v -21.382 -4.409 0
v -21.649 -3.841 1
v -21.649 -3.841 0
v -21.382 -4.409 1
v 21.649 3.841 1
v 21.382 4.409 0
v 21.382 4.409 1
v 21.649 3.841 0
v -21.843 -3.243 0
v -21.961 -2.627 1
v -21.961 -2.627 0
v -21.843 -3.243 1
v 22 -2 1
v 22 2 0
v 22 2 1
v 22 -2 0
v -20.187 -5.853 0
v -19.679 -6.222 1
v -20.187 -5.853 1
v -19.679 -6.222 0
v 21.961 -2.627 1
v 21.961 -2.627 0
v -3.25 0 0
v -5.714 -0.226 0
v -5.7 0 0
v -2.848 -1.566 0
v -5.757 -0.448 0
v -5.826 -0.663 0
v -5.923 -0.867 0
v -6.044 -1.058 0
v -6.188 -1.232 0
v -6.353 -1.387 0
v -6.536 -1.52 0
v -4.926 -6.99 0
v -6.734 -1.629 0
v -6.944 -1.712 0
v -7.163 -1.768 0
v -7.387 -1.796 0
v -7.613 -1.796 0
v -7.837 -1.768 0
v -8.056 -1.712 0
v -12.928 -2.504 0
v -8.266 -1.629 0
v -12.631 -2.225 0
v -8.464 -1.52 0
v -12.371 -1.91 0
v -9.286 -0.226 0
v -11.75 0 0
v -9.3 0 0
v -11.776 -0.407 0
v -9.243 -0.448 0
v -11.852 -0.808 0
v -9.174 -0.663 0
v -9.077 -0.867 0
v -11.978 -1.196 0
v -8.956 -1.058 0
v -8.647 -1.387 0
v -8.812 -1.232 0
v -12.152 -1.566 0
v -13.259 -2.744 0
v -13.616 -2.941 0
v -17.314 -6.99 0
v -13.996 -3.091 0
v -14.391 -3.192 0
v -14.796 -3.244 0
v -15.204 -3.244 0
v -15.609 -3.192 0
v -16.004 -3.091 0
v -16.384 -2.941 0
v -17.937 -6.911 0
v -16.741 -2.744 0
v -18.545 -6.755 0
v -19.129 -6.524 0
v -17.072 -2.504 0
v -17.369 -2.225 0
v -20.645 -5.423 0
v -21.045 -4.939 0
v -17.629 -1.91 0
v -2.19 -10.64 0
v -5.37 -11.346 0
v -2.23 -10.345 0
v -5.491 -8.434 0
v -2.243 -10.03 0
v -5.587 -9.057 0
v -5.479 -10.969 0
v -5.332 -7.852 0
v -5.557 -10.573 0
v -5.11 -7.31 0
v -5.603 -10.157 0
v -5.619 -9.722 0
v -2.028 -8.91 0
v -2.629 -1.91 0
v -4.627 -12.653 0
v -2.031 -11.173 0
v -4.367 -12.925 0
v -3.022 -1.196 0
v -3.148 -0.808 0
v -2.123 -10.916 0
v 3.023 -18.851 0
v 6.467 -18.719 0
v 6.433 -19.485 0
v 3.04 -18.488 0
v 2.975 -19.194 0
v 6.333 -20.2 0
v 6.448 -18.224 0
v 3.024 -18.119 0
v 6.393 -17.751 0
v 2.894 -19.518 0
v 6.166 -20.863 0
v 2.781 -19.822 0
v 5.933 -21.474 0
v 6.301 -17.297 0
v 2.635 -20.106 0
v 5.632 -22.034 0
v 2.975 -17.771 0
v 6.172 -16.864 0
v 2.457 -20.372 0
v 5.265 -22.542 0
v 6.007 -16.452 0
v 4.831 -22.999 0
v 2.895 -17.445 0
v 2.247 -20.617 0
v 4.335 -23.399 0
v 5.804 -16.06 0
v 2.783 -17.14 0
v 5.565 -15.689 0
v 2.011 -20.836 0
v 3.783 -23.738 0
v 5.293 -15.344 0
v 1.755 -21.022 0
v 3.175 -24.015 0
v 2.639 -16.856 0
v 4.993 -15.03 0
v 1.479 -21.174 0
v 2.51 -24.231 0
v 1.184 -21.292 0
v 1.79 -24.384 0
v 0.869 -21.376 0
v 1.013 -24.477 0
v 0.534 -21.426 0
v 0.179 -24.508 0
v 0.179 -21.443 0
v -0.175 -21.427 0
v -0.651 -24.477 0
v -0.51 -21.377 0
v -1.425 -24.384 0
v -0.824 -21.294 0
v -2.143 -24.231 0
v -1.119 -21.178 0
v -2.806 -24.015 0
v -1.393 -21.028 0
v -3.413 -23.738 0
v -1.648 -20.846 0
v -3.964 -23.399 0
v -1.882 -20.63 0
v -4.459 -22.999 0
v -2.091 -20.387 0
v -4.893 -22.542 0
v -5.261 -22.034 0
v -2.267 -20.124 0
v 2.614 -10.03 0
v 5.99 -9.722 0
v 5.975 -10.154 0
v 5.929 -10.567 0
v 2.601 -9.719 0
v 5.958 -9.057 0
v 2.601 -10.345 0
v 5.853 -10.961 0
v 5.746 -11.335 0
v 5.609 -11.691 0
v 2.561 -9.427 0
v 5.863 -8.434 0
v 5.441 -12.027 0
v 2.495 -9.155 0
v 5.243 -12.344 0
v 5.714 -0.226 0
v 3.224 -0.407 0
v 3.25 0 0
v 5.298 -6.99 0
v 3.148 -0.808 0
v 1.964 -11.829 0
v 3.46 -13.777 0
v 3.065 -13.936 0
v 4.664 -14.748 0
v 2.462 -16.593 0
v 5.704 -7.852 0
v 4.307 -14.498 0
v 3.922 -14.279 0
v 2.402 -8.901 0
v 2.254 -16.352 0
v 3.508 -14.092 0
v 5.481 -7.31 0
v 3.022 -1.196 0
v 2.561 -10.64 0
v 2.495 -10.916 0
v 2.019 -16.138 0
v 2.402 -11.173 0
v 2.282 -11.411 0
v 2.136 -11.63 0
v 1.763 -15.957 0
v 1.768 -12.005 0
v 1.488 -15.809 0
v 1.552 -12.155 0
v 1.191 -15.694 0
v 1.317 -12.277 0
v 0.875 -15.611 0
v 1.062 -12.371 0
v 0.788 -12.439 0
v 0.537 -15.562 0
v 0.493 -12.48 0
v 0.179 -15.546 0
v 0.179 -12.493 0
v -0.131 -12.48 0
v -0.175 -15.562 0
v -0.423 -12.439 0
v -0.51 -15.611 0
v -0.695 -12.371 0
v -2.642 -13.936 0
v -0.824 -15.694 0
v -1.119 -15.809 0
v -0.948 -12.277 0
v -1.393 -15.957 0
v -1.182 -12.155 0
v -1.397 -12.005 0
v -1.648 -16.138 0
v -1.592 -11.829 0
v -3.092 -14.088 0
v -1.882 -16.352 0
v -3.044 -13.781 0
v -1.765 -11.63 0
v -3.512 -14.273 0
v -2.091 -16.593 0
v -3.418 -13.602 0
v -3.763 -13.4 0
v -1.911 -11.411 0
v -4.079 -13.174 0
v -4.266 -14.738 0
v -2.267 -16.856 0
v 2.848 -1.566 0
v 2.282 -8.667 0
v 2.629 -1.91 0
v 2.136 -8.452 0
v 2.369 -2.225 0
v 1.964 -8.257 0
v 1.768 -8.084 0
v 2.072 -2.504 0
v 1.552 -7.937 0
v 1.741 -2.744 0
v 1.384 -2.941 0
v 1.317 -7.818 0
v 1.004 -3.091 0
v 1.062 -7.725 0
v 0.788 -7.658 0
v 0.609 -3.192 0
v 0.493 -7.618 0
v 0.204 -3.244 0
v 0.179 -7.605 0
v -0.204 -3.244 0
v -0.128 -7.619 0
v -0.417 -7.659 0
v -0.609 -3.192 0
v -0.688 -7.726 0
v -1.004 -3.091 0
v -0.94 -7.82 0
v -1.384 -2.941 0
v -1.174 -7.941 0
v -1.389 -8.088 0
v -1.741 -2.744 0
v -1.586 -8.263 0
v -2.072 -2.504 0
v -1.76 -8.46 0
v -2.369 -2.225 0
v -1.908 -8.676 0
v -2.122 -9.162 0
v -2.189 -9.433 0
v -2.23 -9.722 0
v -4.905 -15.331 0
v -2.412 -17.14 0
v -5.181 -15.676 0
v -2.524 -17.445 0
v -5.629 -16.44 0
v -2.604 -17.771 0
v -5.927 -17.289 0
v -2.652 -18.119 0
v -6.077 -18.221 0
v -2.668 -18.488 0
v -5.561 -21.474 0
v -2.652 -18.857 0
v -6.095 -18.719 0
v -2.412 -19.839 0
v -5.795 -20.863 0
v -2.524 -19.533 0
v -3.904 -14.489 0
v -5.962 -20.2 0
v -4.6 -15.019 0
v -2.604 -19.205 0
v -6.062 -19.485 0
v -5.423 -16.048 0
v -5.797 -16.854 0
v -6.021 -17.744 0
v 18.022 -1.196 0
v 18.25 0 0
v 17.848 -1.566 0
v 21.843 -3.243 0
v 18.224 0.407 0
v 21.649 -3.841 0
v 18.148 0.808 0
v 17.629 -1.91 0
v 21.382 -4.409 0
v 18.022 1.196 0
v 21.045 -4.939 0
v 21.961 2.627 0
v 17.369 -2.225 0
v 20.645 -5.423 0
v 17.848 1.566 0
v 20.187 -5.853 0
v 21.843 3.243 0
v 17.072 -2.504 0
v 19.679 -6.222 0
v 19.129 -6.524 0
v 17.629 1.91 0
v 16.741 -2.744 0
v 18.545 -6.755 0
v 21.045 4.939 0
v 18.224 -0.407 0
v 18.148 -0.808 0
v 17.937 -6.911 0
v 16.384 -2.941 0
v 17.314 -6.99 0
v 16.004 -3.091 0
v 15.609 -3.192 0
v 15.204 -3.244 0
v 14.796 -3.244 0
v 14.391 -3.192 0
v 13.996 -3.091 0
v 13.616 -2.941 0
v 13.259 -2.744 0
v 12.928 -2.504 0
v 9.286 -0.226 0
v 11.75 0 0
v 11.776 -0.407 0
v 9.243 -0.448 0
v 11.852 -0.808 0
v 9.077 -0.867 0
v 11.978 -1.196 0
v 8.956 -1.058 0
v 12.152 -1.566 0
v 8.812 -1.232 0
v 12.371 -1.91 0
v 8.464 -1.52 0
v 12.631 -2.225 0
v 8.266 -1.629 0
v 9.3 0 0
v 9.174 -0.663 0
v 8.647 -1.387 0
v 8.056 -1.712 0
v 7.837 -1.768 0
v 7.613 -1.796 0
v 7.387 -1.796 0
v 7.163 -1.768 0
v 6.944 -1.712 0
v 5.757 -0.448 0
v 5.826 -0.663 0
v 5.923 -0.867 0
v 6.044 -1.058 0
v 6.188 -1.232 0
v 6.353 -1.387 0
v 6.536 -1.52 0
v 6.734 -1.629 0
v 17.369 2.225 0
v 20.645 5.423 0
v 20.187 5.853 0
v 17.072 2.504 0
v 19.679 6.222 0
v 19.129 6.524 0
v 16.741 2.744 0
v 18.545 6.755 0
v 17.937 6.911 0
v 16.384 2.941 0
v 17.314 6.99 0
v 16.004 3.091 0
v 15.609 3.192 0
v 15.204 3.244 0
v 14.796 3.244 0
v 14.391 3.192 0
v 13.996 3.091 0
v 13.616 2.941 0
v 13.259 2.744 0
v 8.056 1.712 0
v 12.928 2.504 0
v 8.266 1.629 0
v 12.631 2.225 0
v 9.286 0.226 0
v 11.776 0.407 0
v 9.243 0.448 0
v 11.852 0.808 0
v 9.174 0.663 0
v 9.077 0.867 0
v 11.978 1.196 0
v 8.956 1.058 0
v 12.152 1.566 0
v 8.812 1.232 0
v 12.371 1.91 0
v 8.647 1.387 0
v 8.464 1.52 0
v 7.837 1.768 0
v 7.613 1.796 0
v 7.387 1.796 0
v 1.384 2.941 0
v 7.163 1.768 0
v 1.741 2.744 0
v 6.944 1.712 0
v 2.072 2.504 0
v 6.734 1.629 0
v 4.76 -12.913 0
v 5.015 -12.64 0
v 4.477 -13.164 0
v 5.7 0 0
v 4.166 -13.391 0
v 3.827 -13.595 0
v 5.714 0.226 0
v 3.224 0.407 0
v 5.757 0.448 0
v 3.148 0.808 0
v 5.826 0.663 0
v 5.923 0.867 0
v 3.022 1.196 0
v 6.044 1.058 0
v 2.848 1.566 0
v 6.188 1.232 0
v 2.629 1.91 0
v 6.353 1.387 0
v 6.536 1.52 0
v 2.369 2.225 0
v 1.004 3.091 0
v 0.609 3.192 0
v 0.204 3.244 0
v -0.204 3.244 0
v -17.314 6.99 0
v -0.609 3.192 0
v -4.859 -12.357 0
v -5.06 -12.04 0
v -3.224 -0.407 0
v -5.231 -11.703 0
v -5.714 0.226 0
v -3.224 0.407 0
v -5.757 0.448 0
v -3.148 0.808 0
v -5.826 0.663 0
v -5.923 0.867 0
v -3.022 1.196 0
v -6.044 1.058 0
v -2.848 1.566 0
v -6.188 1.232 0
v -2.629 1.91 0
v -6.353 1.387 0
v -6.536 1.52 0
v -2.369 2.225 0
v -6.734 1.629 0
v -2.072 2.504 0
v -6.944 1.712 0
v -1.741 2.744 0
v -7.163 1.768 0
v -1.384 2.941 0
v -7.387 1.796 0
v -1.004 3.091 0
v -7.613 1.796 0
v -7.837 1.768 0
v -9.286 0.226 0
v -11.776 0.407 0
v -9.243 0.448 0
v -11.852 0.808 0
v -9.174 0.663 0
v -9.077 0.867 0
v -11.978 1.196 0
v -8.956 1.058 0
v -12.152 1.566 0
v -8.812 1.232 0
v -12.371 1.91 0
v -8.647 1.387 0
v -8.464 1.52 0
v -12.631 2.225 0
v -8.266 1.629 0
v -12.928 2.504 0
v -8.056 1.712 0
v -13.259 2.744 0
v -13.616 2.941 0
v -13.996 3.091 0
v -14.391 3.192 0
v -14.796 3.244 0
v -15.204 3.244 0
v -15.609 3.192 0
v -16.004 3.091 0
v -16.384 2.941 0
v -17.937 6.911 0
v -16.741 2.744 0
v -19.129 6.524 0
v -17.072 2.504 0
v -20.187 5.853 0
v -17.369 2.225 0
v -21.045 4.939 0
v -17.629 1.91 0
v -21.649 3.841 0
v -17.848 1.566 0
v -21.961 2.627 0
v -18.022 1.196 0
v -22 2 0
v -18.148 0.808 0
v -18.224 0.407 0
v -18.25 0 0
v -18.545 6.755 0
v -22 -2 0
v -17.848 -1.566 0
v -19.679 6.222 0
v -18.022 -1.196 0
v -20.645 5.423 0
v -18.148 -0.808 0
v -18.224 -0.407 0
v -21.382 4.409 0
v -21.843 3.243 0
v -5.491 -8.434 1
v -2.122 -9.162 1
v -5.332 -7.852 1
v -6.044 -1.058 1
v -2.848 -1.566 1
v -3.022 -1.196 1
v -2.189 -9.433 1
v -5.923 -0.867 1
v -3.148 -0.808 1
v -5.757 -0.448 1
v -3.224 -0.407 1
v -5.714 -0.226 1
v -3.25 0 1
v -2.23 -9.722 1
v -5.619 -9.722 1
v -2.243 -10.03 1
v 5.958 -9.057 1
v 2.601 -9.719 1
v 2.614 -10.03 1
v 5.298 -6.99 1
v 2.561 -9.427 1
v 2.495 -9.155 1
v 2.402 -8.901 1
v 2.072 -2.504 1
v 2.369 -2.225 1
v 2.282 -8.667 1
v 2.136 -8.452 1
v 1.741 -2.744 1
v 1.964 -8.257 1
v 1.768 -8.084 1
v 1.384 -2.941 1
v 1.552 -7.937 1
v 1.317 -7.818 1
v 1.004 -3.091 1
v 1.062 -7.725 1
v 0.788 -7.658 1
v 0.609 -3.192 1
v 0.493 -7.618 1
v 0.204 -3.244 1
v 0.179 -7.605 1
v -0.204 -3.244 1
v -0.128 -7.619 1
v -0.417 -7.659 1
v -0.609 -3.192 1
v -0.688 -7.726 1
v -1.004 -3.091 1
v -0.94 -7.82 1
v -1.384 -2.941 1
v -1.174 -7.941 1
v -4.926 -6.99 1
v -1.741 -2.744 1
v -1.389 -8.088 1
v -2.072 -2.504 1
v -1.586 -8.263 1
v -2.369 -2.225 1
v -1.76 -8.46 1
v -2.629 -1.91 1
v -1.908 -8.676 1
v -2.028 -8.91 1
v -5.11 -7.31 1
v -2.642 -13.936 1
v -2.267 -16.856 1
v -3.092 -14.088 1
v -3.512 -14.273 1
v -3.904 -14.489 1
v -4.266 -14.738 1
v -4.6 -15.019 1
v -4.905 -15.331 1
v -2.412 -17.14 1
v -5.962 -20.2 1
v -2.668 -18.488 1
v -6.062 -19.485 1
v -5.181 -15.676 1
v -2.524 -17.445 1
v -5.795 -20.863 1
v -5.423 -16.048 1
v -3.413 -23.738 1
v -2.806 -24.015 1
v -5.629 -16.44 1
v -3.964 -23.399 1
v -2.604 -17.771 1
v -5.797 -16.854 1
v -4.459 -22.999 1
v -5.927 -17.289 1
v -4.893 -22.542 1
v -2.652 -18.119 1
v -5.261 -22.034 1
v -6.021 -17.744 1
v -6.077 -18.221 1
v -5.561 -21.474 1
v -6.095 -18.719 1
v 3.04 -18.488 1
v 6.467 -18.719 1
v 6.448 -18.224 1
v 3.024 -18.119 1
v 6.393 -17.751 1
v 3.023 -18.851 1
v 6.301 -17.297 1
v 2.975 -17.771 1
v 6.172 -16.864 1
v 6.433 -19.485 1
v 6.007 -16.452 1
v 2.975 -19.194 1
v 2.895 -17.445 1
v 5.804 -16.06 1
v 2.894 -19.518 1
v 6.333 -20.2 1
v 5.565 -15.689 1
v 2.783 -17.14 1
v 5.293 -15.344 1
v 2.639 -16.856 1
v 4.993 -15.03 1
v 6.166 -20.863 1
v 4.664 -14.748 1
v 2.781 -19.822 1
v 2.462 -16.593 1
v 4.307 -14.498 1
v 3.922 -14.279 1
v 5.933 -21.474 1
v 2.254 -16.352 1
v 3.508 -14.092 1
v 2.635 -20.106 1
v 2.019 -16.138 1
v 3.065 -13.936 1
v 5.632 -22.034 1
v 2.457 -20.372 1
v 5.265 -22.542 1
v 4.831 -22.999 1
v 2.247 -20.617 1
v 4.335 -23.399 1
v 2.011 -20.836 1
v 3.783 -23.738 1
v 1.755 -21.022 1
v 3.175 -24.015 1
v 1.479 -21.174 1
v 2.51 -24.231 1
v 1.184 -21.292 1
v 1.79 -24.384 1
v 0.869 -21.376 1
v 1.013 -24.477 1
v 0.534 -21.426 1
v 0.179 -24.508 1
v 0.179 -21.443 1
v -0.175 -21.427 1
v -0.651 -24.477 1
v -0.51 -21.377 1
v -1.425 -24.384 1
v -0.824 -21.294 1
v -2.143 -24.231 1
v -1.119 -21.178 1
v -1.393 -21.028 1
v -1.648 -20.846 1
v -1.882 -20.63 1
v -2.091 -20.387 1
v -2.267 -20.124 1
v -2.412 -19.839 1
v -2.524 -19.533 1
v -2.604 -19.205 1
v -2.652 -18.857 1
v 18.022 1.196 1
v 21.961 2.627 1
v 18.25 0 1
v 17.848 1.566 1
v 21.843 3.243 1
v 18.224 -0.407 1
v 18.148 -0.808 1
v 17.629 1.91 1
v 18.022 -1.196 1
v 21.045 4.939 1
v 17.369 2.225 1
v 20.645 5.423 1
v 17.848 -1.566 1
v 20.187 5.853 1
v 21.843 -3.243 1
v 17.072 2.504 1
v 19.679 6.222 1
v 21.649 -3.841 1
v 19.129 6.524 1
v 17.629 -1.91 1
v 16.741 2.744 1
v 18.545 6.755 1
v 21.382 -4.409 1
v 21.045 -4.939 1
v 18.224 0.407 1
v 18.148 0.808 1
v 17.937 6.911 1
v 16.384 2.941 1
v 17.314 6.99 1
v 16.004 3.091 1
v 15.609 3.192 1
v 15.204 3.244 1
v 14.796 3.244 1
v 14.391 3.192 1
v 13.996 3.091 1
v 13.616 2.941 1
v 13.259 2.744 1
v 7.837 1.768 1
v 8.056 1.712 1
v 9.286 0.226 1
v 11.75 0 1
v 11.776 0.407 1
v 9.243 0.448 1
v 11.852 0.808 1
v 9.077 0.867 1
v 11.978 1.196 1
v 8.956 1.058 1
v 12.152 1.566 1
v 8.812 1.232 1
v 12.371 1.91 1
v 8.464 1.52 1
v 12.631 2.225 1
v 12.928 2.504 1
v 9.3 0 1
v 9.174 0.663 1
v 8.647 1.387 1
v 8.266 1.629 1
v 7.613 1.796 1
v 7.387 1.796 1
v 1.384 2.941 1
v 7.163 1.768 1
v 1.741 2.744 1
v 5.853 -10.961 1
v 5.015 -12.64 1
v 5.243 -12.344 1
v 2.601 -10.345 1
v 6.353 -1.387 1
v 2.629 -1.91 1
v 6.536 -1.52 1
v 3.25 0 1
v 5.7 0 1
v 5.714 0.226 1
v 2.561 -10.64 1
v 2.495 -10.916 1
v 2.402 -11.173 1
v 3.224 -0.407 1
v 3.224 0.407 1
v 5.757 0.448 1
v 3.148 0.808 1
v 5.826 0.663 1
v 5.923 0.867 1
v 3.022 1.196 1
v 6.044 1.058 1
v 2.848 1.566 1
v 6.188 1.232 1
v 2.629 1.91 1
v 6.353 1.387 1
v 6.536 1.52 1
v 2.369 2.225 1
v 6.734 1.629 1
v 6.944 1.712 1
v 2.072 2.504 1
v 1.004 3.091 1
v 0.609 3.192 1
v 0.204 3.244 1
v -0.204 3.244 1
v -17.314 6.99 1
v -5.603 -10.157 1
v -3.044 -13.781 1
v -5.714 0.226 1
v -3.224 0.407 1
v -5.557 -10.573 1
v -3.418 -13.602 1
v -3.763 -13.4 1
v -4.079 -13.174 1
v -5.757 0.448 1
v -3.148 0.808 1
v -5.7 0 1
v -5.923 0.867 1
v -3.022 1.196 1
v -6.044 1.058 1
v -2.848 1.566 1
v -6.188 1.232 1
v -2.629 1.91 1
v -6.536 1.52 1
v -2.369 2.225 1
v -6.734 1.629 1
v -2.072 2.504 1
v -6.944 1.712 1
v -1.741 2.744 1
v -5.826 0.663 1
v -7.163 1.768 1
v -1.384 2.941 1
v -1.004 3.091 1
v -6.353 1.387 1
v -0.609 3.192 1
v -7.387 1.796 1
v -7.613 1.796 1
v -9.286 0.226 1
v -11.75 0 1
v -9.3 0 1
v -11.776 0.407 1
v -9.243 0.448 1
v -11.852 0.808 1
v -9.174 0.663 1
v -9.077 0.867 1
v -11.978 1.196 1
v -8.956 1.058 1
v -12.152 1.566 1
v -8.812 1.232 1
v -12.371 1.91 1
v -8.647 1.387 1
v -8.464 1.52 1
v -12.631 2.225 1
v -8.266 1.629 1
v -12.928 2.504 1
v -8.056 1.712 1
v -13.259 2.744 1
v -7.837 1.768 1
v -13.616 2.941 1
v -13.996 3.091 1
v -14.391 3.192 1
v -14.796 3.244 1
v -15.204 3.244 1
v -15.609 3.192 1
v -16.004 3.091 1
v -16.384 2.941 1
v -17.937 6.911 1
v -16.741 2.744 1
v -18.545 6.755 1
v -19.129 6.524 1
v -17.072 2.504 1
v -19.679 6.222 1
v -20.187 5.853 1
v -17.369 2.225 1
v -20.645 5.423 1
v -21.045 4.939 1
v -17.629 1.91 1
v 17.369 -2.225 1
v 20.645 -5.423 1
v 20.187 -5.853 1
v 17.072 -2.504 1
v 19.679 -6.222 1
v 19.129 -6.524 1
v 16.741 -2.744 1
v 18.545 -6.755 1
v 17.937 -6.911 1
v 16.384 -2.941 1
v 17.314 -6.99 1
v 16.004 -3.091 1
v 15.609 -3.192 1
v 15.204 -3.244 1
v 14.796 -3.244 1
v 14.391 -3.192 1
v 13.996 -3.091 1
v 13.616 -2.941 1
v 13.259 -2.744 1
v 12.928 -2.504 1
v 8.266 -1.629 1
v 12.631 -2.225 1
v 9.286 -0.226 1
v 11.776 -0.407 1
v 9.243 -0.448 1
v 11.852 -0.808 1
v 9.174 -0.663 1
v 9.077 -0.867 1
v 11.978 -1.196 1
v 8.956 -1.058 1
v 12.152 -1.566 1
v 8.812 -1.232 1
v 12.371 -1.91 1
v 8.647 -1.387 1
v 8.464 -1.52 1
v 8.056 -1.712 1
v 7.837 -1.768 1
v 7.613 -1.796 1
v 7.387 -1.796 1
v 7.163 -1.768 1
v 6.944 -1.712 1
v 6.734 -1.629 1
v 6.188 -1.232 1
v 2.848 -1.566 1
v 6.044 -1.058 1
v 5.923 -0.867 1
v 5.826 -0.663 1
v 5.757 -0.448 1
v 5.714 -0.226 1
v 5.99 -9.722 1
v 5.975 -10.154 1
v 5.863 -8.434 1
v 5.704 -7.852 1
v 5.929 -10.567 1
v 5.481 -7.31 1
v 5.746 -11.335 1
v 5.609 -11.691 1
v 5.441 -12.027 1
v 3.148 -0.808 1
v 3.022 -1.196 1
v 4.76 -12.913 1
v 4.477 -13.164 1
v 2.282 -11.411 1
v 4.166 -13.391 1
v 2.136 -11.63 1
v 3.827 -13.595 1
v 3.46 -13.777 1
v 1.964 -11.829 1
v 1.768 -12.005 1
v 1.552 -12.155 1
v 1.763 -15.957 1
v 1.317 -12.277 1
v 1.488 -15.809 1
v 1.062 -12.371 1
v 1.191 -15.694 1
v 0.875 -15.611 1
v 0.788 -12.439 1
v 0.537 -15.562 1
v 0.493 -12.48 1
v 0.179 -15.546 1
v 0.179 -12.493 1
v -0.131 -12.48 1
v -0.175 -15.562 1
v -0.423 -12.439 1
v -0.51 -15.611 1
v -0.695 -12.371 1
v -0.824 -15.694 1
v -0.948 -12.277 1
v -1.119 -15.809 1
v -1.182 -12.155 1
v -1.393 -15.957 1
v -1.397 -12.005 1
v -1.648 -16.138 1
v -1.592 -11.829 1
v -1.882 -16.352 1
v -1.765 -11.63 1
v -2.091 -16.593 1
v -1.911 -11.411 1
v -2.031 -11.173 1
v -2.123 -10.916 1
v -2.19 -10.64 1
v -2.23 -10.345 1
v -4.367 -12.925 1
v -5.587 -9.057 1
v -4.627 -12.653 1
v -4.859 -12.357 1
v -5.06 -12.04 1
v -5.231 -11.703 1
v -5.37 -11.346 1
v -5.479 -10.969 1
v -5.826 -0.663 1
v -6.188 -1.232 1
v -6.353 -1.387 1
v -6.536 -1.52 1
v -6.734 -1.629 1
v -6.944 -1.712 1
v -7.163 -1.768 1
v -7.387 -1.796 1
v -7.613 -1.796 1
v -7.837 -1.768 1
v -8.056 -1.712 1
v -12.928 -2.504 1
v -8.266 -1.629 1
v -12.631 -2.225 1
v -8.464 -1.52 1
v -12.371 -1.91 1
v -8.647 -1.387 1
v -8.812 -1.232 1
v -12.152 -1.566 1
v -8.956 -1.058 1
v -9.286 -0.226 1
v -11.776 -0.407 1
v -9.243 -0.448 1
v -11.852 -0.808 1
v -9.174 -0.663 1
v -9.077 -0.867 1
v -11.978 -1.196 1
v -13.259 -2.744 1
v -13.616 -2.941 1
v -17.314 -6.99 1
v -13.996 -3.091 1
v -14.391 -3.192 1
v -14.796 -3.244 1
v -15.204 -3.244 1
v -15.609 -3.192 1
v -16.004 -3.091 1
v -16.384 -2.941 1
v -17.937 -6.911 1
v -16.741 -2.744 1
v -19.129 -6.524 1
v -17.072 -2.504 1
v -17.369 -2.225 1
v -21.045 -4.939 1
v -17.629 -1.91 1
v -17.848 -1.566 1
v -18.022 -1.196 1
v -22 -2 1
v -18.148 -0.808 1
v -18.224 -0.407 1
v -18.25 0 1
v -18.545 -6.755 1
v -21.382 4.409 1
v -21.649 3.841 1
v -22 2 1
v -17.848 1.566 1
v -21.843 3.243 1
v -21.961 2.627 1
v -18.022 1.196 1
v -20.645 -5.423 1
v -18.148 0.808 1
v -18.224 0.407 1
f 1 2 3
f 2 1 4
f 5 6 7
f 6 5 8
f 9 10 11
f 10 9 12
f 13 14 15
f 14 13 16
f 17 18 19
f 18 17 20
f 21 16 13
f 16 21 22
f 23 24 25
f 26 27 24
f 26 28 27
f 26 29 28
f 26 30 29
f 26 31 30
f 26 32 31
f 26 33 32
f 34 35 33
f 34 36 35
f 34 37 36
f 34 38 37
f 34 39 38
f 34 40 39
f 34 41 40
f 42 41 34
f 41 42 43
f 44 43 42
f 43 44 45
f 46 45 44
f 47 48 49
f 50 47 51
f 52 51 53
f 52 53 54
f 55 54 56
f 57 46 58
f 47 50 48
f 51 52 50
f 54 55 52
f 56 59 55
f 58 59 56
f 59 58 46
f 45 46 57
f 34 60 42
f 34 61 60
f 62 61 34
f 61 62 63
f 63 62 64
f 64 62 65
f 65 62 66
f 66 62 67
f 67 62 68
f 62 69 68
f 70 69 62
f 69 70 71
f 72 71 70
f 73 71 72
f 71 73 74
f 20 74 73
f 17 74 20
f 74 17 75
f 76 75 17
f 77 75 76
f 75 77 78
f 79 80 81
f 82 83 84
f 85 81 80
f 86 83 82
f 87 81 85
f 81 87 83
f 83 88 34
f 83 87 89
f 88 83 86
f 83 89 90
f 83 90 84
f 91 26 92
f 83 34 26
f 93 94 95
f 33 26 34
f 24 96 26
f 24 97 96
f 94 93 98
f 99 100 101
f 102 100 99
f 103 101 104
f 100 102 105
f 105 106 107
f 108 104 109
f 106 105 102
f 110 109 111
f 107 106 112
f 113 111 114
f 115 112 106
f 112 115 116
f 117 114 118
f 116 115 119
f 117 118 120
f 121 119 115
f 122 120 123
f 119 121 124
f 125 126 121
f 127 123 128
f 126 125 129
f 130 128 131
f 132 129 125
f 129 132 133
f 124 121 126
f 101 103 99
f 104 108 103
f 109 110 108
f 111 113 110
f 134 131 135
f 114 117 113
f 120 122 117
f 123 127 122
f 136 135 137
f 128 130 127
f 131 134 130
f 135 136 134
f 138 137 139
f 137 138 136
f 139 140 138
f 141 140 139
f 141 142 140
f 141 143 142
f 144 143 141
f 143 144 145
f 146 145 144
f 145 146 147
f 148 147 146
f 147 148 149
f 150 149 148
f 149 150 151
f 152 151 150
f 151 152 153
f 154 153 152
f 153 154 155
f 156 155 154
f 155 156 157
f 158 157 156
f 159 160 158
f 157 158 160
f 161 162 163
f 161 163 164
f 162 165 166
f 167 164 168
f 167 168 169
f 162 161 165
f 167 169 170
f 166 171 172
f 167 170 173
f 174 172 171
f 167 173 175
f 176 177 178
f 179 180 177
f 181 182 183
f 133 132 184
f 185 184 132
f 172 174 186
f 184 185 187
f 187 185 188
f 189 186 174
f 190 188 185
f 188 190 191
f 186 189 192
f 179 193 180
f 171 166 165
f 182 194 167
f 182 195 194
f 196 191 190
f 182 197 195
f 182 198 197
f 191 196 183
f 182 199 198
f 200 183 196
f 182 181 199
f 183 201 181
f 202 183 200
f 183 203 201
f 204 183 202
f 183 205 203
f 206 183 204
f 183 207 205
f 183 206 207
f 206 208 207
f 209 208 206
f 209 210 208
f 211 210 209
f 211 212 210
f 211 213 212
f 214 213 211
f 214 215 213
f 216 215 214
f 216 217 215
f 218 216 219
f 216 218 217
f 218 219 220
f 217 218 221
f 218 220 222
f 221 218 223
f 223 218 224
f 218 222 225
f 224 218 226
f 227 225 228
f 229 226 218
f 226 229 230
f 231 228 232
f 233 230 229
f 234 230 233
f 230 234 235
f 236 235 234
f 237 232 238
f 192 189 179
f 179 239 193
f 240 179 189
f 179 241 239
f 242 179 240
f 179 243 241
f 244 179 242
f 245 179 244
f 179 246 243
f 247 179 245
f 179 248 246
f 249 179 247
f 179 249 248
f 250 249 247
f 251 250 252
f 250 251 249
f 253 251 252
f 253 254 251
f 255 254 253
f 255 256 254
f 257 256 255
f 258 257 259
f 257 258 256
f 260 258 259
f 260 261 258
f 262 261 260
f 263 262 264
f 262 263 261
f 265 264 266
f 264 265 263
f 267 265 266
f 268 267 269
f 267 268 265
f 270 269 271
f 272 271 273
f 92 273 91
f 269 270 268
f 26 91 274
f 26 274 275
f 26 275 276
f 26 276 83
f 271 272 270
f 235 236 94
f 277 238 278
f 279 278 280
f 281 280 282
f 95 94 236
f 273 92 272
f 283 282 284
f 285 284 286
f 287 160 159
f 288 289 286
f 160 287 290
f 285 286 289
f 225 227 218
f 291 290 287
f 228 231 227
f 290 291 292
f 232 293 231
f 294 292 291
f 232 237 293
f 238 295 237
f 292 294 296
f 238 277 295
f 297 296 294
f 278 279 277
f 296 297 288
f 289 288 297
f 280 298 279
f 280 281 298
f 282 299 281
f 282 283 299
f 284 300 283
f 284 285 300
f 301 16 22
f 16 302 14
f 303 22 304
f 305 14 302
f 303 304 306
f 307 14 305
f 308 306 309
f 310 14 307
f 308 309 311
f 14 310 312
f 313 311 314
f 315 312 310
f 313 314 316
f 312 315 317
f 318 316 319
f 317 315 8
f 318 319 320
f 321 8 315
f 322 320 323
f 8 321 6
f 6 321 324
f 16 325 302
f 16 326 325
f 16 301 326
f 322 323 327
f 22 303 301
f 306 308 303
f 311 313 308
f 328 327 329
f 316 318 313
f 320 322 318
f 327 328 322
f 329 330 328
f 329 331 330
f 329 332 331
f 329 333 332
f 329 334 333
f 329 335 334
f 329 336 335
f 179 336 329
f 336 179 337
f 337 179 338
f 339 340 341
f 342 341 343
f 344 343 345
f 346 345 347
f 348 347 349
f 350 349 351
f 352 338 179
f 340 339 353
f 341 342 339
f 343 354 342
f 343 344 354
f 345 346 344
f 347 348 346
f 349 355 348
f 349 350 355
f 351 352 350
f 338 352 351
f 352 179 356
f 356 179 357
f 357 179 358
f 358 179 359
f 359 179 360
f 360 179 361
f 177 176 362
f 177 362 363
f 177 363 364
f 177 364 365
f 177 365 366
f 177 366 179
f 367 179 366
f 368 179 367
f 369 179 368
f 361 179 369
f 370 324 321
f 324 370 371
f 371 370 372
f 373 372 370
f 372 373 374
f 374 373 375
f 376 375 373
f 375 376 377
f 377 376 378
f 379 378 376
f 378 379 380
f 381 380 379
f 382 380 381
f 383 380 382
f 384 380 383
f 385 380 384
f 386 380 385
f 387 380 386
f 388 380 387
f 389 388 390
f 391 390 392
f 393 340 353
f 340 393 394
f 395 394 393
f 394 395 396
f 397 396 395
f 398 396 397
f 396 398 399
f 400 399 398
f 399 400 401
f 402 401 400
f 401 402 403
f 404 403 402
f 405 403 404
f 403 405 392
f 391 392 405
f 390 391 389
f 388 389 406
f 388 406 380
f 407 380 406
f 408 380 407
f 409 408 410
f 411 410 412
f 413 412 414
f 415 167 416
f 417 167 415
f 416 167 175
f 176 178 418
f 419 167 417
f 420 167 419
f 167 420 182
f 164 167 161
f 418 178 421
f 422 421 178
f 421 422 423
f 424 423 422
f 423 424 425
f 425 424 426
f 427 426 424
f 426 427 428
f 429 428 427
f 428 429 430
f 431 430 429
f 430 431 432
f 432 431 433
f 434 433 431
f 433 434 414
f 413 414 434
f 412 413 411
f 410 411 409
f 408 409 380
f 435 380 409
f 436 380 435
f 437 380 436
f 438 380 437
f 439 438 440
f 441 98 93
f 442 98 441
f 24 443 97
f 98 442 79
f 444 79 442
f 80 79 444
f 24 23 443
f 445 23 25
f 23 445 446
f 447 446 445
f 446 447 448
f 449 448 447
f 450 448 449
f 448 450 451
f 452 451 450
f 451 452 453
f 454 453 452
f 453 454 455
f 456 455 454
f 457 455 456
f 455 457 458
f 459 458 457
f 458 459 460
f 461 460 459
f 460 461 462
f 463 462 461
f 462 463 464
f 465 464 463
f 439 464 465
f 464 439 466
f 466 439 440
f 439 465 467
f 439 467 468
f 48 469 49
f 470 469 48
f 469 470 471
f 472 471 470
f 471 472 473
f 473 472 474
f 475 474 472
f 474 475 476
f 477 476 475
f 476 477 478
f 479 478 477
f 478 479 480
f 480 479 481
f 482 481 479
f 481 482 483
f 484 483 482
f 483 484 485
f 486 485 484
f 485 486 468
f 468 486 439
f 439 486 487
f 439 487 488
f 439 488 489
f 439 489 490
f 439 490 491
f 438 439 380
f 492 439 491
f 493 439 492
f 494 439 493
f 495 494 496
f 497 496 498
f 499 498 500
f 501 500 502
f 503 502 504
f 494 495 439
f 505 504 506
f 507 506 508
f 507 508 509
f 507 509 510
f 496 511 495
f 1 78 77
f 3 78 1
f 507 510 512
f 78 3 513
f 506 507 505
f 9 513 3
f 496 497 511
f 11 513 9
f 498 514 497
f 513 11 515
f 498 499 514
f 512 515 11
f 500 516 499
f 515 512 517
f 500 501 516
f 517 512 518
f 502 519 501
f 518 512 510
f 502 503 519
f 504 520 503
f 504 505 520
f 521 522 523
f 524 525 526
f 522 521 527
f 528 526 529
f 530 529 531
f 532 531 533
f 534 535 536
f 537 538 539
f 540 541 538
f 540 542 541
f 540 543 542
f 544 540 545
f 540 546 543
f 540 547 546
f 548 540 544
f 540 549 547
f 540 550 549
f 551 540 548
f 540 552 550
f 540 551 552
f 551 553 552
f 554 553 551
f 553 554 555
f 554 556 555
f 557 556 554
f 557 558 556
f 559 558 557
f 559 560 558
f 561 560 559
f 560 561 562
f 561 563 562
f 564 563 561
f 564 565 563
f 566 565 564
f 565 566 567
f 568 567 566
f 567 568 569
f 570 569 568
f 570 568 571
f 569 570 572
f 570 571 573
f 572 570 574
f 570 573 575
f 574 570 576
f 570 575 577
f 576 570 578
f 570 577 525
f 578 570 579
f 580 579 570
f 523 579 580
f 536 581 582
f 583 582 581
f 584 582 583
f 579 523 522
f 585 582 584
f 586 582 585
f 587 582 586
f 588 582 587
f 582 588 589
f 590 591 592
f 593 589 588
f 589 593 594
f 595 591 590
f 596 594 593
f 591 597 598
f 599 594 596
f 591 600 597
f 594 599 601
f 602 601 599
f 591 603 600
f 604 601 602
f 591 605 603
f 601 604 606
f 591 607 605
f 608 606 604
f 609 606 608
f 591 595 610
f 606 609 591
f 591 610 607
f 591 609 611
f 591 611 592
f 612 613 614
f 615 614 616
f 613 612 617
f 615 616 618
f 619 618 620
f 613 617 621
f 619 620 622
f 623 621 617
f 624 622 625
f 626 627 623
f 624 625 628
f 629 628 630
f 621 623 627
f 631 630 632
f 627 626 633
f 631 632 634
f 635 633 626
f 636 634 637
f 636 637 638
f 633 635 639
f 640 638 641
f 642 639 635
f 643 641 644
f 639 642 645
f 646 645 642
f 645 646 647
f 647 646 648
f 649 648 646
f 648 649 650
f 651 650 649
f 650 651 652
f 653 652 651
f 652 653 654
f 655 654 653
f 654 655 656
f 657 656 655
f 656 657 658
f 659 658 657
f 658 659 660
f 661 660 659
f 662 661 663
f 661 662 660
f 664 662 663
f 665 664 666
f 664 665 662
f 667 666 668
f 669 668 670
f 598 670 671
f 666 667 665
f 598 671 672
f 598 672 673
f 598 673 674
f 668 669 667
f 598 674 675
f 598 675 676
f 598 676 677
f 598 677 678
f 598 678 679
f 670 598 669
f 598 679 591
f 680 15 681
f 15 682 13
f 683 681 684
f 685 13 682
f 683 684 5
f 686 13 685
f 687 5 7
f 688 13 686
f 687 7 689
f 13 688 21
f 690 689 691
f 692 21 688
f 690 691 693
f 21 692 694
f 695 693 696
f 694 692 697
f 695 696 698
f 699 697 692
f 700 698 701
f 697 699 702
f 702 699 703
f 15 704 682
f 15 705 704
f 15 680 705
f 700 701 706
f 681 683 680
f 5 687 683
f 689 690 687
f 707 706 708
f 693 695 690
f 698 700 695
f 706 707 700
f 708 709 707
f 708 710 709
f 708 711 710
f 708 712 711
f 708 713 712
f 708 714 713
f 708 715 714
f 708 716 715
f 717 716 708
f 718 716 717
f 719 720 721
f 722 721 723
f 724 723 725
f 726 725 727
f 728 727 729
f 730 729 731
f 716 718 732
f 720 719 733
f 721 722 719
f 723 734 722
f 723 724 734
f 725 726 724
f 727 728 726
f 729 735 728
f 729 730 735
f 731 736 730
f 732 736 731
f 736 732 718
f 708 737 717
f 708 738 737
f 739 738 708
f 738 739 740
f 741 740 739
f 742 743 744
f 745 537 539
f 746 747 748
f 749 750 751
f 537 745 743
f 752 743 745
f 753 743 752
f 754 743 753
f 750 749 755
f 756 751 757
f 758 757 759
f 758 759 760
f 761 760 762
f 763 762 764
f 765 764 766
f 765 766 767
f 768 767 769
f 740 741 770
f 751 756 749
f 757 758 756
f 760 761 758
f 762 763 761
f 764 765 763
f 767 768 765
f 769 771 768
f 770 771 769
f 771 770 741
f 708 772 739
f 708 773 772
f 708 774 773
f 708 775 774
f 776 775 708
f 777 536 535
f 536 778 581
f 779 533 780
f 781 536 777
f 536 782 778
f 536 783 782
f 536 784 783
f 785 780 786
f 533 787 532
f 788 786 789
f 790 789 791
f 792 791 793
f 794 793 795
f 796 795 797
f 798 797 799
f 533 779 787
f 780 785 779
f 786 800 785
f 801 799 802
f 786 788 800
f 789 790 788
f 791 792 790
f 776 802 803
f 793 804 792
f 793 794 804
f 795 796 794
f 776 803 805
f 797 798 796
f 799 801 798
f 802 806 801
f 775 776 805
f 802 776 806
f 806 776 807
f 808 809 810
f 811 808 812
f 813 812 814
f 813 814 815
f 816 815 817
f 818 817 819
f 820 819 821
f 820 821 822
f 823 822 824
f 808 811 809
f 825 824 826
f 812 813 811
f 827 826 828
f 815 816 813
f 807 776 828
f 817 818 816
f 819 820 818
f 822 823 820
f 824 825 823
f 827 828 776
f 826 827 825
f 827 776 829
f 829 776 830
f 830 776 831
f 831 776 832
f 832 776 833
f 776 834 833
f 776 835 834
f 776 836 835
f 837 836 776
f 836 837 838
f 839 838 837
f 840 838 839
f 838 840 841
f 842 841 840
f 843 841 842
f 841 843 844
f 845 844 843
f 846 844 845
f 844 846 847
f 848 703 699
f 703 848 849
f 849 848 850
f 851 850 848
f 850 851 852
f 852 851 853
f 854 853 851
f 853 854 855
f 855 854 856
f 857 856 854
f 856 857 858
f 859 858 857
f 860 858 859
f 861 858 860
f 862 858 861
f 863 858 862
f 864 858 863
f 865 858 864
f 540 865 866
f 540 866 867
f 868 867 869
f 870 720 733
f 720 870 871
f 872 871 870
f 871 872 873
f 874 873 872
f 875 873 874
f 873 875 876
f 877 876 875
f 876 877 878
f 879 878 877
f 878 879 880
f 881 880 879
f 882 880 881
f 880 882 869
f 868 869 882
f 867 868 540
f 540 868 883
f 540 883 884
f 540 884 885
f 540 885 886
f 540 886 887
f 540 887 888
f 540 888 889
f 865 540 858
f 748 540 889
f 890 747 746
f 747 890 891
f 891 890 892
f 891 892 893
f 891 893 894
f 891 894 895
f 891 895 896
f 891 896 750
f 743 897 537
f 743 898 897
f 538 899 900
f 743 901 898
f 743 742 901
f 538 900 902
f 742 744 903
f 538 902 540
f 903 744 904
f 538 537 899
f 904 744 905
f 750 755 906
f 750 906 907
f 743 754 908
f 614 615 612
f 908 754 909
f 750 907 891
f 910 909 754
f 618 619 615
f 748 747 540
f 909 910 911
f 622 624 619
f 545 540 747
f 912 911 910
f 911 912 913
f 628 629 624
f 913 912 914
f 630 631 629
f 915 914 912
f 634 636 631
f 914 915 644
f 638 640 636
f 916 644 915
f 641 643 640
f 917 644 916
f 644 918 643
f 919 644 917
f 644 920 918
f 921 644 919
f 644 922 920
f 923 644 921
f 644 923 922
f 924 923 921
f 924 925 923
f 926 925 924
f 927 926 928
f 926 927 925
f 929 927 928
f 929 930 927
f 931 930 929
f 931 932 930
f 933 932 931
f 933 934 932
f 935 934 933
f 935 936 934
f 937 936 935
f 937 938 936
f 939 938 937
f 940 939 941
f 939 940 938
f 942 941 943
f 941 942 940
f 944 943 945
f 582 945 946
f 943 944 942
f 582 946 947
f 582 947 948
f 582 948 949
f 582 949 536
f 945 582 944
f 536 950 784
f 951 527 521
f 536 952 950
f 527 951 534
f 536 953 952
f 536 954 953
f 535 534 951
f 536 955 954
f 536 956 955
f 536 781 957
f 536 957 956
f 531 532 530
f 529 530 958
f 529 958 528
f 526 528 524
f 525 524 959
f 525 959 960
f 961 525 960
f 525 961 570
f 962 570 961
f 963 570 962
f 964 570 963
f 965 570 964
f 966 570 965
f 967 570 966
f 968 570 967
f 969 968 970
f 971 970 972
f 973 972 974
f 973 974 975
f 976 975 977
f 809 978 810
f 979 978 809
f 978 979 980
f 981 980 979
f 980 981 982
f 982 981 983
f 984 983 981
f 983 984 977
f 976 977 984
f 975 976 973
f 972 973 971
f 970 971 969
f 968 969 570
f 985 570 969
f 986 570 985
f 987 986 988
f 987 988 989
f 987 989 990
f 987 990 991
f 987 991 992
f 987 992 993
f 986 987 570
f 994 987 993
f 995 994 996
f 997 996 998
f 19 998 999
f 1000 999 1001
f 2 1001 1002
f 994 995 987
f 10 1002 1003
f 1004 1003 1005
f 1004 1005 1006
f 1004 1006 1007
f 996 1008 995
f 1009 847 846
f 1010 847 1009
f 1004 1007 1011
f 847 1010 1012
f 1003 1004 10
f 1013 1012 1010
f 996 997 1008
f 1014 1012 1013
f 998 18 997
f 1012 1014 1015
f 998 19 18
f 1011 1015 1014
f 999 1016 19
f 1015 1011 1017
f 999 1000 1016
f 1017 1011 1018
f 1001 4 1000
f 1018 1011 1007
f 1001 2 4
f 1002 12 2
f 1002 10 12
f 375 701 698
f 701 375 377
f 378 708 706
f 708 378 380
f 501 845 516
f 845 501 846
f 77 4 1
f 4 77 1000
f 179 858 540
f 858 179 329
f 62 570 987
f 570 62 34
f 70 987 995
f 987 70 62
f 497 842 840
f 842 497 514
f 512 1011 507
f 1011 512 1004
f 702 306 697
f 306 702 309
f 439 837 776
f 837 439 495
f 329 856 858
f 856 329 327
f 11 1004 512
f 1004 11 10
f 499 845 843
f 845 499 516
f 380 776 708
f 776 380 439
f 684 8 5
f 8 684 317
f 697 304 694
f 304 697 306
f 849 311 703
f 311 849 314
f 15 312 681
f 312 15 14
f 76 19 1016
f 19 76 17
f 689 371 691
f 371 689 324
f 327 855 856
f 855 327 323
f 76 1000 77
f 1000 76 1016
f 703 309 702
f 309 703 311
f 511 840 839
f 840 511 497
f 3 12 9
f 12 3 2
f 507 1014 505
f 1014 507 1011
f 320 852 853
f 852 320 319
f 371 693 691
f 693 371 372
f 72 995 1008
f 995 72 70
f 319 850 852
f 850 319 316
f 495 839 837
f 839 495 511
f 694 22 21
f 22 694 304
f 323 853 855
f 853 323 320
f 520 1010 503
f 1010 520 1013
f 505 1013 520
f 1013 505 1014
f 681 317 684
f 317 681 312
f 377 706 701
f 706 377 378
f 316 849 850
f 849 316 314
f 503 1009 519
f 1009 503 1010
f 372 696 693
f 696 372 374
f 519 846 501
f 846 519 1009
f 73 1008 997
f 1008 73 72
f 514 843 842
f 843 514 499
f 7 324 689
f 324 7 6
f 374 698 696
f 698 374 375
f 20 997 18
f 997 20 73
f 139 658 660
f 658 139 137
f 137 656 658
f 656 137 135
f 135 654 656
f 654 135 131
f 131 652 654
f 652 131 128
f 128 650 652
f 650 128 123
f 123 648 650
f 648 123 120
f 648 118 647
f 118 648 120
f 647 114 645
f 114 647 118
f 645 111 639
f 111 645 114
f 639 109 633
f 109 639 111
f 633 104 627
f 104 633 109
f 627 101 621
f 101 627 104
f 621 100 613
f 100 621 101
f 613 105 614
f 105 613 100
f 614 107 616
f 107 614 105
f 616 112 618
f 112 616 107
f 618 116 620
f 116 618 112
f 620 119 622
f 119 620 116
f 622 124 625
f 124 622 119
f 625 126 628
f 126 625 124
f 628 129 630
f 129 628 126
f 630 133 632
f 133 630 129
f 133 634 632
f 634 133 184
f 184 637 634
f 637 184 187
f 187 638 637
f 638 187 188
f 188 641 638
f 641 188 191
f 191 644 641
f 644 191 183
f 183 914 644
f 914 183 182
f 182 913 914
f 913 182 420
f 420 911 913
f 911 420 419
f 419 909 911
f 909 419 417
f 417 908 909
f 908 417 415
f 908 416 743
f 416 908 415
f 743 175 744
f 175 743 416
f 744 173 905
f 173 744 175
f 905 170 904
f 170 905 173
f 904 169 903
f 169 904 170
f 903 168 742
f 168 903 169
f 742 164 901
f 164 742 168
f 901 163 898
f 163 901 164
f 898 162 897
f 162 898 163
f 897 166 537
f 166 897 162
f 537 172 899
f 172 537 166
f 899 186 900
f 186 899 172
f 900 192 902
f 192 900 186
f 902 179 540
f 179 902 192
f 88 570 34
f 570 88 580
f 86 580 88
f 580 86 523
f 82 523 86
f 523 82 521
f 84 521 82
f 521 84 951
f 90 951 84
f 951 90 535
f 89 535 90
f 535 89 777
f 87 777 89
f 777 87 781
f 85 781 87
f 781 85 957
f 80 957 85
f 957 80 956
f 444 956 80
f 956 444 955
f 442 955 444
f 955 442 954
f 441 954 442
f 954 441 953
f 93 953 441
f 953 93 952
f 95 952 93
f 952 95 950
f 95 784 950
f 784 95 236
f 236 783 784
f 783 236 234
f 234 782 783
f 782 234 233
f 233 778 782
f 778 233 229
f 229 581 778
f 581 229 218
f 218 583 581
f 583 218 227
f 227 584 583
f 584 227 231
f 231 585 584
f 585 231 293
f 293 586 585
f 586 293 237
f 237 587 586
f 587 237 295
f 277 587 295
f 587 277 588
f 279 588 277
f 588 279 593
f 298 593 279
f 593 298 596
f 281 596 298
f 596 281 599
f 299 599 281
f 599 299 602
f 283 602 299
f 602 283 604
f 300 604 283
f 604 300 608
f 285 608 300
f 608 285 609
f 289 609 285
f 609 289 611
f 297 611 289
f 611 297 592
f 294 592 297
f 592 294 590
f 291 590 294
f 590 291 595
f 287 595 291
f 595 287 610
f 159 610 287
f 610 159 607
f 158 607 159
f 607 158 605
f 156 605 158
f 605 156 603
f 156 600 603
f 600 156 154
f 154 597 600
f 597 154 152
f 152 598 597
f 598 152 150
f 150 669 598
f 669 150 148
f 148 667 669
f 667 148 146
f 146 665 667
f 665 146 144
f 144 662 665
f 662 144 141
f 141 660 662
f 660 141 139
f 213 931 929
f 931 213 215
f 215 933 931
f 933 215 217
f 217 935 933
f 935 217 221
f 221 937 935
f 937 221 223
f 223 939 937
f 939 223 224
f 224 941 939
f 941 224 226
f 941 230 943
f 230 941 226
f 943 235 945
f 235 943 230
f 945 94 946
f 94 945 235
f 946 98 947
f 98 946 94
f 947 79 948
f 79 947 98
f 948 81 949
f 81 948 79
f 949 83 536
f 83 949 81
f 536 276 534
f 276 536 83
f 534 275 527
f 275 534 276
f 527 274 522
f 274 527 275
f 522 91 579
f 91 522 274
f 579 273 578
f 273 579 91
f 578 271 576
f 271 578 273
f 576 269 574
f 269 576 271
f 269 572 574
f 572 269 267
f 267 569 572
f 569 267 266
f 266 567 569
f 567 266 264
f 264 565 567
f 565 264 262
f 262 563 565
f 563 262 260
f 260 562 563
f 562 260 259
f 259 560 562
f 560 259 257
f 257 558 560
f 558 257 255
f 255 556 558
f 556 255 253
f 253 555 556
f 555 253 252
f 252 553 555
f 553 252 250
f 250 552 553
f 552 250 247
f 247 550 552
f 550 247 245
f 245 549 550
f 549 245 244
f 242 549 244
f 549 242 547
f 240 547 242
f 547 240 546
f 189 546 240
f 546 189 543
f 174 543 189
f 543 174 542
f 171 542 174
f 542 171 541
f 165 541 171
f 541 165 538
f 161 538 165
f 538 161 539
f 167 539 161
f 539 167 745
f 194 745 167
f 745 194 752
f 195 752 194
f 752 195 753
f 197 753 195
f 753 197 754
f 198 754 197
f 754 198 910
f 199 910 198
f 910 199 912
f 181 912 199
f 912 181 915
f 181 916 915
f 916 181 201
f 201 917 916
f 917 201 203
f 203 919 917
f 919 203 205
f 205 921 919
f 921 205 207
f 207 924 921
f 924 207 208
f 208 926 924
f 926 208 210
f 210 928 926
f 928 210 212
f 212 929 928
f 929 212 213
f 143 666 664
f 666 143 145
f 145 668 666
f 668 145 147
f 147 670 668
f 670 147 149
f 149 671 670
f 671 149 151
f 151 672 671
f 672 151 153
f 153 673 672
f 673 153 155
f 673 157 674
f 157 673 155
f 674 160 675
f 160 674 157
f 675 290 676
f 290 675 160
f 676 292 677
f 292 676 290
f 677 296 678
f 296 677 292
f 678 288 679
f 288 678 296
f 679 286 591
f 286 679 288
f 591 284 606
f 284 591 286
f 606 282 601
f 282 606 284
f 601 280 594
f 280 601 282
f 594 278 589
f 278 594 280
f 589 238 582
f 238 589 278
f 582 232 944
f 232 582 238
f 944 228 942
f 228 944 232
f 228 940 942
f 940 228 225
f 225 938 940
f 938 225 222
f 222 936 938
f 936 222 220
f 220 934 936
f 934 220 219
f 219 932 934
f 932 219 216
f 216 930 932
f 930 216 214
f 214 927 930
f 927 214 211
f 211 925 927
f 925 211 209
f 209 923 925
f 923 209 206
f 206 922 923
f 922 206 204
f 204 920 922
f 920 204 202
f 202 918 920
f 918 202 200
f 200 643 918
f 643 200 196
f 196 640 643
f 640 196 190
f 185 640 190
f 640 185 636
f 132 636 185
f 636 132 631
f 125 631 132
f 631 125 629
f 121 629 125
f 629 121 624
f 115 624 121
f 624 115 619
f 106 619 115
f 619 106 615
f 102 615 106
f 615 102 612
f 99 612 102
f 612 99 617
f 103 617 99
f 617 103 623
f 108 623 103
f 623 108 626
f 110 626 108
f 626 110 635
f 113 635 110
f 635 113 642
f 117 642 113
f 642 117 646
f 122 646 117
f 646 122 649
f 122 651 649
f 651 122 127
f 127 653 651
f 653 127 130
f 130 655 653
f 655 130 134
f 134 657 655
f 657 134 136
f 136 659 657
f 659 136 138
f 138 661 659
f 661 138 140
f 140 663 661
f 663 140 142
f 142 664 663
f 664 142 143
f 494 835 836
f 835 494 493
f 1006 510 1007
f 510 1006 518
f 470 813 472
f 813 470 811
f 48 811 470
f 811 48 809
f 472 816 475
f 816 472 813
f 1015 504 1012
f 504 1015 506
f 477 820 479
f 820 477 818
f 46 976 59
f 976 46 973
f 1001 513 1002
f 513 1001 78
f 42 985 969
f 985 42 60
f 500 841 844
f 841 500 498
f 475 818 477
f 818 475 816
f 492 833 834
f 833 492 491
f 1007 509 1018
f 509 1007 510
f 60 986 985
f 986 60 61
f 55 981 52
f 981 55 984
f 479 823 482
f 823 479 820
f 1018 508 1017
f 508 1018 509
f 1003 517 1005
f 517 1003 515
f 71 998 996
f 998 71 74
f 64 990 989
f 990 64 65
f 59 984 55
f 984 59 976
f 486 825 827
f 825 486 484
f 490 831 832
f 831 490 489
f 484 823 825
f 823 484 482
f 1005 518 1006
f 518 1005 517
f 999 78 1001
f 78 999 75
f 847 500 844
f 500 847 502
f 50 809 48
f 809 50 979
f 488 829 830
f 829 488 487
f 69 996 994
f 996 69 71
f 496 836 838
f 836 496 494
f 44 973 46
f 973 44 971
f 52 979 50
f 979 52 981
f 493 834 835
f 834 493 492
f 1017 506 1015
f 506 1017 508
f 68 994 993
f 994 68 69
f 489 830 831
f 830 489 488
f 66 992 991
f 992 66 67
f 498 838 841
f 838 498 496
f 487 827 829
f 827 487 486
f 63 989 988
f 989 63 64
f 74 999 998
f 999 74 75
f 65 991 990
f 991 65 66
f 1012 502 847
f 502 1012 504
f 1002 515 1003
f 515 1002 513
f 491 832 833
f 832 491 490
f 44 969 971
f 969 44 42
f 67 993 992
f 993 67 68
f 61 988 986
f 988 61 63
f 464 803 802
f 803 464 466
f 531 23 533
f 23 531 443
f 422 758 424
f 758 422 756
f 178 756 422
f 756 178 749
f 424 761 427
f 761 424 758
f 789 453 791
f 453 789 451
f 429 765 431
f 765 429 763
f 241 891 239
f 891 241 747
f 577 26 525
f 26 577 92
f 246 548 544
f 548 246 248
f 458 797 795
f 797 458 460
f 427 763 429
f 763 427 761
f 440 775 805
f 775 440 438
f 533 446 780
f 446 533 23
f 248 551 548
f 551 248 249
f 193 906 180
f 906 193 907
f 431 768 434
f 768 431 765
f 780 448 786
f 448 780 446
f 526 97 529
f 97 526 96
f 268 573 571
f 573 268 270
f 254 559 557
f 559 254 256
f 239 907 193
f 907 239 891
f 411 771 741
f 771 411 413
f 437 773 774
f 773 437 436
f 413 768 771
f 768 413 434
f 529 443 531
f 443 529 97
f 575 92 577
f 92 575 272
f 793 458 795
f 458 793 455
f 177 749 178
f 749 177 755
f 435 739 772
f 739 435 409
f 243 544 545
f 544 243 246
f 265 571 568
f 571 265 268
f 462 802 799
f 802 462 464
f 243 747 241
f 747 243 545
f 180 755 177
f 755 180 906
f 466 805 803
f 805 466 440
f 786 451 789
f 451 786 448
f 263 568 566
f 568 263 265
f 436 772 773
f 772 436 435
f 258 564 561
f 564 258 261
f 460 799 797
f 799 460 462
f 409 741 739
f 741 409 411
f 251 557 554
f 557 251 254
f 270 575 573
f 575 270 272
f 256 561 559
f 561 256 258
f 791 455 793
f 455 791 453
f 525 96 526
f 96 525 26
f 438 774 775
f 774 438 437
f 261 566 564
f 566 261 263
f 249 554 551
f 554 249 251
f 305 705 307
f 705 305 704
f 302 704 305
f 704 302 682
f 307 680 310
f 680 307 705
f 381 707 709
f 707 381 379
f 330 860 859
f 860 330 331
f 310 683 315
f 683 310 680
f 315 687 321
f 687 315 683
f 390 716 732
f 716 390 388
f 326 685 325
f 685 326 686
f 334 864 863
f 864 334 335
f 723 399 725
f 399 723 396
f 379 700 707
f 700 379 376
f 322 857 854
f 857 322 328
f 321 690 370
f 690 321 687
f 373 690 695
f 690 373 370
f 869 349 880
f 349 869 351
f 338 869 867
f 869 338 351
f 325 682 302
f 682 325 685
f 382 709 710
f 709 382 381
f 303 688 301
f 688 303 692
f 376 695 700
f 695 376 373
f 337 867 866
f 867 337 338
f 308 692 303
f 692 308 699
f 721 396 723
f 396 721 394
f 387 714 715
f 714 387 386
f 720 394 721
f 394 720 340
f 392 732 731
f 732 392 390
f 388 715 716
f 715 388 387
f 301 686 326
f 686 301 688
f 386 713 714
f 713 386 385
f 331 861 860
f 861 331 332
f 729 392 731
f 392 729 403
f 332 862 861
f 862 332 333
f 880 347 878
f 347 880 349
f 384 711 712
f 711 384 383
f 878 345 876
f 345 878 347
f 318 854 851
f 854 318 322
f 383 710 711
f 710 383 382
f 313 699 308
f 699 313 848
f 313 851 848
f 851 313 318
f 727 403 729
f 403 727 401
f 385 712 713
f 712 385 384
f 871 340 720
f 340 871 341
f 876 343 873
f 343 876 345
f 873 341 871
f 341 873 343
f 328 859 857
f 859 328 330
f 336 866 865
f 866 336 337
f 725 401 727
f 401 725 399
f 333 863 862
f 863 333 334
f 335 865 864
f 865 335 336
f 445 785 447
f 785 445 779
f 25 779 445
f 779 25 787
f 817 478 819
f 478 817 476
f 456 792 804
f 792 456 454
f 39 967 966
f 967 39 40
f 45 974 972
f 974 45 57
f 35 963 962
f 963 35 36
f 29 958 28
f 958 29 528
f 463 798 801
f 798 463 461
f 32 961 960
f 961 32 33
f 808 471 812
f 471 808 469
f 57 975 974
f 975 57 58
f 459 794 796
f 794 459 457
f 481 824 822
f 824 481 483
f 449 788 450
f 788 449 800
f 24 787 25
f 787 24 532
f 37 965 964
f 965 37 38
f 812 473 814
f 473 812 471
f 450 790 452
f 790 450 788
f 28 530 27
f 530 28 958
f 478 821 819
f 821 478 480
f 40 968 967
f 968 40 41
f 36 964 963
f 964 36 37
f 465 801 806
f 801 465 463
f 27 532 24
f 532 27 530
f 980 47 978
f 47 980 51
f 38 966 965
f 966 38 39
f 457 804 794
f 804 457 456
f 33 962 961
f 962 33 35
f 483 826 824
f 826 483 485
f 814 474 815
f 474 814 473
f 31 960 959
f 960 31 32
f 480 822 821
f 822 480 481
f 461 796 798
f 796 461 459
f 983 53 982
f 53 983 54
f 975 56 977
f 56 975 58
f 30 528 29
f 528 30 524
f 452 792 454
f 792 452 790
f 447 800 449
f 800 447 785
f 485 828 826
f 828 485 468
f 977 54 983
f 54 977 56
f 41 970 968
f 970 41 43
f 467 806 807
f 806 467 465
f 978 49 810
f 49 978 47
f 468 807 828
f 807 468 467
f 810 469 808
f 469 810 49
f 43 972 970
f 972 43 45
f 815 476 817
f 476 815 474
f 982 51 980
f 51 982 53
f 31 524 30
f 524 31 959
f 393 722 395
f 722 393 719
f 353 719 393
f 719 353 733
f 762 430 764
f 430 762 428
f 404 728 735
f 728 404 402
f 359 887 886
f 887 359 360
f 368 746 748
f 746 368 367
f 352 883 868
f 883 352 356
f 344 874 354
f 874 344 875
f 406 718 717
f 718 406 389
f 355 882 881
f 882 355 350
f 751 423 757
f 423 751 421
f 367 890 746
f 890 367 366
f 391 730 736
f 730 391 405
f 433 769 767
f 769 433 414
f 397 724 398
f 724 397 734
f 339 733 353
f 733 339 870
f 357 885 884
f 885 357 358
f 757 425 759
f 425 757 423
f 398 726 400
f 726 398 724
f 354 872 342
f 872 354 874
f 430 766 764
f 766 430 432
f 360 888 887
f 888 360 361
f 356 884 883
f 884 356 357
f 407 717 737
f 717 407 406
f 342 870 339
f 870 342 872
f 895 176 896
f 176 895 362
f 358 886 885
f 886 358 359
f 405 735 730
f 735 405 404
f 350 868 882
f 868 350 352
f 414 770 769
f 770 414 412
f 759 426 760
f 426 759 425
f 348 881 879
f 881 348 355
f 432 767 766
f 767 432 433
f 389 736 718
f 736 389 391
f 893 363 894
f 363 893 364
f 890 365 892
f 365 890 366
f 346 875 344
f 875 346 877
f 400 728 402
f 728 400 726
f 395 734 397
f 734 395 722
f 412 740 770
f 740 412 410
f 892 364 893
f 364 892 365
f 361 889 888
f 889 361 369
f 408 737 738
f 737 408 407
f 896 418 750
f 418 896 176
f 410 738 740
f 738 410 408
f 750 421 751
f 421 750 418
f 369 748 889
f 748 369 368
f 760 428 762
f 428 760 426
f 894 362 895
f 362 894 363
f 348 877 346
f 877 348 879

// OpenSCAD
$fn = 50;


difference() {
	union() {
		hull() {
			translate(v = [-17.0000000000, 2.0000000000, 0]) {
				cylinder(h = 1, r = 5);
			}
			translate(v = [17.0000000000, 2.0000000000, 0]) {
				cylinder(h = 1, r = 5);
			}
			translate(v = [-17.0000000000, -2.0000000000, 0]) {
				cylinder(h = 1, r = 5);
			}
			translate(v = [17.0000000000, -2.0000000000, 0]) {
				cylinder(h = 1, r = 5);
			}
		}
		translate(v = [0, -5, 0]) {
			linear_extrude(height = 1) {
				text(font = "DejaVu Sans Mono:style=Bold", halign = "center", size = 19.0000000000, text = "8", valign = "top");
			}
		}
	}
	union() {
		translate(v = [-15.0000000000, 0.0000000000, 0]) {
			translate(v = [0, 0, -100]) {
				cylinder(h = 200, r = 3.2500000000);
			}
		}
		translate(v = [0, 0, -100]) {
			cylinder(h = 200, r = 3.2500000000);
		}
		translate(v = [15.0000000000, 0.0000000000, 0]) {
			translate(v = [0, 0, -100]) {
				cylinder(h = 200, r = 3.2500000000);
			}
		}
		translate(v = [-15.0000000000, 0.0000000000, 0]) {
			translate(v = [0, 0, -100]) {
				cylinder(h = 200, r = 1.8000000000);
			}
		}
		translate(v = [-7.5000000000, 0.0000000000, 0]) {
			translate(v = [0, 0, -100]) {
				cylinder(h = 200, r = 1.8000000000);
			}
		}
		translate(v = [0, 0, -100]) {
			cylinder(h = 200, r = 1.8000000000);
		}
		translate(v = [7.5000000000, 0.0000000000, 0]) {
			translate(v = [0, 0, -100]) {
				cylinder(h = 200, r = 1.8000000000);
			}
		}
		translate(v = [15.0000000000, 0.0000000000, 0]) {
			translate(v = [0, 0, -100]) {
				cylinder(h = 200, r = 1.8000000000);
			}
		}
	}
}
